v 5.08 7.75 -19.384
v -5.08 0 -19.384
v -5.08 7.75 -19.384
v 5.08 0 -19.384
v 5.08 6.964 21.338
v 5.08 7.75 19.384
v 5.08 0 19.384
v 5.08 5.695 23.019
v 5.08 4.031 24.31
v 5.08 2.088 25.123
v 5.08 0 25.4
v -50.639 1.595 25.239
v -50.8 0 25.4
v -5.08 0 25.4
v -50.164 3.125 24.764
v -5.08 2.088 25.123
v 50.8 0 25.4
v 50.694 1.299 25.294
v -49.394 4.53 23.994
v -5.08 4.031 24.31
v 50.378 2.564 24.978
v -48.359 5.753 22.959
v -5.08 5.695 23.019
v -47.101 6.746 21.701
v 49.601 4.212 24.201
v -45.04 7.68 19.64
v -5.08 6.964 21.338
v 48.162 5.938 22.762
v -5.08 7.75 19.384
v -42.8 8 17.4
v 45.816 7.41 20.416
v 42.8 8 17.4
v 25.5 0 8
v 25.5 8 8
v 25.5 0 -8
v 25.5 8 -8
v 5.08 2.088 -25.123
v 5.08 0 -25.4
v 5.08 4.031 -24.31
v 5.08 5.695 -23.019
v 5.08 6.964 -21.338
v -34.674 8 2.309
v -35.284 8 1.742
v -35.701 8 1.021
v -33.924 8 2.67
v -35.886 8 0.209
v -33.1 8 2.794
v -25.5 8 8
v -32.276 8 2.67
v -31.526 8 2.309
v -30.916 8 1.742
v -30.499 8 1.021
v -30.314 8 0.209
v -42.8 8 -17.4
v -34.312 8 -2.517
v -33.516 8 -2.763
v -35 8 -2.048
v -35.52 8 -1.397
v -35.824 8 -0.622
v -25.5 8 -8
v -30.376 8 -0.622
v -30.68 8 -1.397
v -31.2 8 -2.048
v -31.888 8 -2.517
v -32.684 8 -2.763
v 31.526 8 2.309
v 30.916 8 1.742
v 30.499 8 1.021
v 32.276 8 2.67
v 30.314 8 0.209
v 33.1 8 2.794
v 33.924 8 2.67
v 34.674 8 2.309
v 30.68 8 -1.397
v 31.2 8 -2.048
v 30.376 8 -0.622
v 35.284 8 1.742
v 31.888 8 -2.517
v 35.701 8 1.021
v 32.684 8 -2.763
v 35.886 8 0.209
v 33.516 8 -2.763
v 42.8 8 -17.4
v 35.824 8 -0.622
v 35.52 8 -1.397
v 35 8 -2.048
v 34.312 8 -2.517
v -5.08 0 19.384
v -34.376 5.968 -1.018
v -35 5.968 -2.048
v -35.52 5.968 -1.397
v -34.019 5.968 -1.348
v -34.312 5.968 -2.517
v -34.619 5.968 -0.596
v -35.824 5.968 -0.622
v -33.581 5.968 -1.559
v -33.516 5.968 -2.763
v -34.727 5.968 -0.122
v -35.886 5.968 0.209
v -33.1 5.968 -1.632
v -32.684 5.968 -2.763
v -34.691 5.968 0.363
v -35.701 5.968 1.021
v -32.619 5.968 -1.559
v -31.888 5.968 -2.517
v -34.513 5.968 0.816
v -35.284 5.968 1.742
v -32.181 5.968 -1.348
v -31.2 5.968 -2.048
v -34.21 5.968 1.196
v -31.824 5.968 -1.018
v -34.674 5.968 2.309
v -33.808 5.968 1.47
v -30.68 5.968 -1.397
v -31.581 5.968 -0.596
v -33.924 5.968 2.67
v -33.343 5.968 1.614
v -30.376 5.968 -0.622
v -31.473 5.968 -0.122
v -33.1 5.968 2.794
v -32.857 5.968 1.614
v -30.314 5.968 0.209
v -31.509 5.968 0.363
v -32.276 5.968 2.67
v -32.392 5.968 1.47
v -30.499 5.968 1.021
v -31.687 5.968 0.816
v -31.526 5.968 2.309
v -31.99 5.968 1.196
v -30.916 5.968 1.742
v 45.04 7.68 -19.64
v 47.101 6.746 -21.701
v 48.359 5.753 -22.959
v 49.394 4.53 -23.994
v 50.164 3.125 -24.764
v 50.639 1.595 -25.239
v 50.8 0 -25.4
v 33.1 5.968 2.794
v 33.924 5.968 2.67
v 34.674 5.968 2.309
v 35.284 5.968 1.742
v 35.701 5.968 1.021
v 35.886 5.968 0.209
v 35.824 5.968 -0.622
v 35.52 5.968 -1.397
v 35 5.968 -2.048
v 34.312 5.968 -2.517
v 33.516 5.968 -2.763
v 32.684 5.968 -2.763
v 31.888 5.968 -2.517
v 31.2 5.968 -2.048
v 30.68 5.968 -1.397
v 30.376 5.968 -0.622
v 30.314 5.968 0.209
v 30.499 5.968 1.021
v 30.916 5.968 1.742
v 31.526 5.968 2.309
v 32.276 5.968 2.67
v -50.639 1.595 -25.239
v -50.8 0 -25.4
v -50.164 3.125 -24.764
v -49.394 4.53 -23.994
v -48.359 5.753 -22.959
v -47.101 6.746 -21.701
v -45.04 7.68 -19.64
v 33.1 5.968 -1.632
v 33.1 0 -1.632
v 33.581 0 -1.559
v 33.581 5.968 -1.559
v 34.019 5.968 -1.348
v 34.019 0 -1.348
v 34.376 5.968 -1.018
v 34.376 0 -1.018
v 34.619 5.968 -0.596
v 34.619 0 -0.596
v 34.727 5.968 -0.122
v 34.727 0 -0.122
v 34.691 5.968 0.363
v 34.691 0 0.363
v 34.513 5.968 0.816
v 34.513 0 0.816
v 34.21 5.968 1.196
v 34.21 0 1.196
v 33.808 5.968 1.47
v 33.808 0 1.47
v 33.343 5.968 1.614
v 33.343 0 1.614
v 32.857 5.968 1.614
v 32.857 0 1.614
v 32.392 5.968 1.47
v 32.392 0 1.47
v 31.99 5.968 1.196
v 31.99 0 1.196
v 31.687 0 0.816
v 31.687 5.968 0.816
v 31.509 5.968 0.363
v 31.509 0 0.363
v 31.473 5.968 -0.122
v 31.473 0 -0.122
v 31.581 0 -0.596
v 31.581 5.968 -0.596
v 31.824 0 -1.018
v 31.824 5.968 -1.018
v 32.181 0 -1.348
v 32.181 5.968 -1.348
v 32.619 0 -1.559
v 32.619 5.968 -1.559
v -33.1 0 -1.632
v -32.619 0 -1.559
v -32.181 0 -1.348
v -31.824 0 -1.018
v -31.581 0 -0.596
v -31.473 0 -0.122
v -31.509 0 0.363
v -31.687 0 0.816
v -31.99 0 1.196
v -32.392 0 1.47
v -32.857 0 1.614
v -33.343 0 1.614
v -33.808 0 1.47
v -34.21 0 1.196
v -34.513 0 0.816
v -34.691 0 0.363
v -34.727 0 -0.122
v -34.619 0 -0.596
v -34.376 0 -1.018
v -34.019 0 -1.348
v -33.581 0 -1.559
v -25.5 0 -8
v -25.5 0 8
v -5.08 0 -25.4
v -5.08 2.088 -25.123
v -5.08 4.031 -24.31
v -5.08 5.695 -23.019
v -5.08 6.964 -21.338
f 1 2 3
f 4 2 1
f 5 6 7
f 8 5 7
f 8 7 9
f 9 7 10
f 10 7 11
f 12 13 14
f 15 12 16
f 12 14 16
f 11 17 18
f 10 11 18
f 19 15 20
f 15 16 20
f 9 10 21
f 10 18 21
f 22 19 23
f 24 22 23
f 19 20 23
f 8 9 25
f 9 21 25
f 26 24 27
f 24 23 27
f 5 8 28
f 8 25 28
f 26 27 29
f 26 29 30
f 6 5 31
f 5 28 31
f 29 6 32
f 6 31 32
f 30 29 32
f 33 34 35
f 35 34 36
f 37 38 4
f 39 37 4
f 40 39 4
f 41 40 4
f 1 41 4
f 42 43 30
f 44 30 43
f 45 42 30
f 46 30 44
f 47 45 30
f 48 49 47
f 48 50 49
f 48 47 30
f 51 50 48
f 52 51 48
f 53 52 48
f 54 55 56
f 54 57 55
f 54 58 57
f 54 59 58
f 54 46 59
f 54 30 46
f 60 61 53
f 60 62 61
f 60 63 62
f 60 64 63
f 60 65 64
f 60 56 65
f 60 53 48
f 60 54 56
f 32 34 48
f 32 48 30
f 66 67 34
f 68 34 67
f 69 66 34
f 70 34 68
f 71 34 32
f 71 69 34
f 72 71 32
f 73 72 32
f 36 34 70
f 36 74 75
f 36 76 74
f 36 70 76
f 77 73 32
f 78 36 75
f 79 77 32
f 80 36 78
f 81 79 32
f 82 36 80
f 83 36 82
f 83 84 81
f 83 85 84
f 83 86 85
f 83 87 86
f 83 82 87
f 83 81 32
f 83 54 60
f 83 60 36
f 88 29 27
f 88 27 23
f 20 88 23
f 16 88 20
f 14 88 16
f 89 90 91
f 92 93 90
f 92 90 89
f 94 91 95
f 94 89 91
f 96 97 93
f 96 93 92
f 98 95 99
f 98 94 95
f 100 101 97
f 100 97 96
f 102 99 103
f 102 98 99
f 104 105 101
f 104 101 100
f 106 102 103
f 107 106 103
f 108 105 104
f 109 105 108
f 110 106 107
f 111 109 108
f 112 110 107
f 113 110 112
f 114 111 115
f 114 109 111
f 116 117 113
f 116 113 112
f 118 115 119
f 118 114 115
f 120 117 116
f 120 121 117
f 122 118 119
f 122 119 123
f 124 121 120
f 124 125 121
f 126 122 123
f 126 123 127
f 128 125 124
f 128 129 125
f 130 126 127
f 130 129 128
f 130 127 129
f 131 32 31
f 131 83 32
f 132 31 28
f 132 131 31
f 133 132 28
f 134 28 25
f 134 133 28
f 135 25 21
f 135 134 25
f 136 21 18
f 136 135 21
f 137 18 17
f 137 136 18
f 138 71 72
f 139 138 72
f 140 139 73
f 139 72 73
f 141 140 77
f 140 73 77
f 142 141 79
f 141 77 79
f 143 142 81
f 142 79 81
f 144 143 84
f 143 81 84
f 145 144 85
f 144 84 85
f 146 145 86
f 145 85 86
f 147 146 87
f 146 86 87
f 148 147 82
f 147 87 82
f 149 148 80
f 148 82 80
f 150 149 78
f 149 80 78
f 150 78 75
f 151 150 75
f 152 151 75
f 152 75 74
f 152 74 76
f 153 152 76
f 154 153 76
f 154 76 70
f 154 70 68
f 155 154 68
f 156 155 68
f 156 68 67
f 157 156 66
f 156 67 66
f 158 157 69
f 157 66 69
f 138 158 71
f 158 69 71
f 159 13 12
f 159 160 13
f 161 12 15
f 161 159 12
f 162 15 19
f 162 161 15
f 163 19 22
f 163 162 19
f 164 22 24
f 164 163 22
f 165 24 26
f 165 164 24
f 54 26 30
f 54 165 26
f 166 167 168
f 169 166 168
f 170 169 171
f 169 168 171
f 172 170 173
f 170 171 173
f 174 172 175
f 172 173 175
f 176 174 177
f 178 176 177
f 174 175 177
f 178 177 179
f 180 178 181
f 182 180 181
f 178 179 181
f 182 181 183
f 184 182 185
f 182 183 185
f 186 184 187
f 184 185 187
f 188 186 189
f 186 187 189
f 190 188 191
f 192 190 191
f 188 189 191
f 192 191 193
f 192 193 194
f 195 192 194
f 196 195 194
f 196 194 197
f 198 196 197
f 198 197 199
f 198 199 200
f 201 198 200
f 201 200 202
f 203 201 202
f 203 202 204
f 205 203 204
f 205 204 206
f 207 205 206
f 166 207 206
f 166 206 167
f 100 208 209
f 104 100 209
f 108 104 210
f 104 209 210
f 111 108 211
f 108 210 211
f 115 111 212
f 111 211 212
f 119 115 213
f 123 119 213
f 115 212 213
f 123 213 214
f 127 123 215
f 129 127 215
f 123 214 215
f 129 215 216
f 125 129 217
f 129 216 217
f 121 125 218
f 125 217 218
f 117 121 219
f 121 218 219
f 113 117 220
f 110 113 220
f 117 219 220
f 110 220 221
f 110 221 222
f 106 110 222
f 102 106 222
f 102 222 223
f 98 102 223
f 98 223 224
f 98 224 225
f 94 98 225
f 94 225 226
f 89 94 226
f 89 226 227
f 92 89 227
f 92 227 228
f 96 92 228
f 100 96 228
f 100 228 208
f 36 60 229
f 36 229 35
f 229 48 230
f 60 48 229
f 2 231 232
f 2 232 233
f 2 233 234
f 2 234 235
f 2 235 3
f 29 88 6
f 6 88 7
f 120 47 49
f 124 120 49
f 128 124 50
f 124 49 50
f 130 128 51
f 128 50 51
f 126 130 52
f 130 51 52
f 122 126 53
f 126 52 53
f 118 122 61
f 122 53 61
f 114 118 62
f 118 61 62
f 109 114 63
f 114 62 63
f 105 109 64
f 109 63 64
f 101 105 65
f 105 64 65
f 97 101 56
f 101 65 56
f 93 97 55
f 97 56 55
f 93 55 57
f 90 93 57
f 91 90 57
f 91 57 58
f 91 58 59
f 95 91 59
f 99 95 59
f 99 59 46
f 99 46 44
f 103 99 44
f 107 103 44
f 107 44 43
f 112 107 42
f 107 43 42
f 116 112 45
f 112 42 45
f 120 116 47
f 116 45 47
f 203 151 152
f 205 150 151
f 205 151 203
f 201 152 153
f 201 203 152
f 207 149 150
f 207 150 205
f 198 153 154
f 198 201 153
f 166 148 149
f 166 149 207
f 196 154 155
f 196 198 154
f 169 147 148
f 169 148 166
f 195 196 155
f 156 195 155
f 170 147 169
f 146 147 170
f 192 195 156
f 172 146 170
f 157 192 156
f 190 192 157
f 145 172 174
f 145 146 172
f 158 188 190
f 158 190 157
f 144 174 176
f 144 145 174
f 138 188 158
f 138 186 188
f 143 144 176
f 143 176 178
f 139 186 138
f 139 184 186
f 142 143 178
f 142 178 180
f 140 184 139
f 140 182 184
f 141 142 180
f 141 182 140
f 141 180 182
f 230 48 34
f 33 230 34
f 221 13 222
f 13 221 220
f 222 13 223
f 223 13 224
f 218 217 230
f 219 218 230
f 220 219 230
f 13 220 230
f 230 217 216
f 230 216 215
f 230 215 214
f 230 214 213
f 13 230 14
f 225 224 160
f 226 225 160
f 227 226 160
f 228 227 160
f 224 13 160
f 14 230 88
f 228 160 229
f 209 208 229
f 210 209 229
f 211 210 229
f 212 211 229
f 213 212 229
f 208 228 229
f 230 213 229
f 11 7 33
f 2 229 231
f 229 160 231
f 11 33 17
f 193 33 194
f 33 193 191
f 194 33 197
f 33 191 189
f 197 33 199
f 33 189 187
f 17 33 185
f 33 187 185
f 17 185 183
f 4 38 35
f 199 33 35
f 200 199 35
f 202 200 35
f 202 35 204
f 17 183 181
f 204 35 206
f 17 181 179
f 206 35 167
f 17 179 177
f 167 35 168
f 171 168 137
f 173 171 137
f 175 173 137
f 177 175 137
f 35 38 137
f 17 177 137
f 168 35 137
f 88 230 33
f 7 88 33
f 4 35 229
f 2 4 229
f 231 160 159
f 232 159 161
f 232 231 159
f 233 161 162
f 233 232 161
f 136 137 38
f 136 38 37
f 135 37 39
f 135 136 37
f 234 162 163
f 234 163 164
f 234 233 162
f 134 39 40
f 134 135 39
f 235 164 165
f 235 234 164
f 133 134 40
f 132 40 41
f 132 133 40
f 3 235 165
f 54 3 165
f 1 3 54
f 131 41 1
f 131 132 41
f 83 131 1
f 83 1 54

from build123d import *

# Parameters (mm, degrees)
SKETCH2_W           = 101.6
SKETCH2_H           = 50.8
BOSS_EXTRUDE1_DEPTH = 8
SKETCH3_W           = 51
SKETCH3_H           = 16
CUT_EXTRUDE1_DEPTH  = 58.356778152
FILLET1_R           = 8
SKETCH5_R           = 1.63195
CUT_EXTRUDE2_DEPTH  = 58.356778152
SKETCH6_R           = 1.63195
CUT_EXTRUDE3_DEPTH  = 58.356778152
SKETCH7_W           = 10.16
SKETCH7_H           = 6.016
CUT_EXTRUDE4_DEPTH  = 58.356778152
SKETCH8_W           = 10.16
SKETCH8_H           = 6.016
CUT_EXTRUDE5_DEPTH  = 58.356778152
SKETCH9_R           = 2.794
CUT_EXTRUDE6_DEPTH  = 2.032
SKETCH10_R          = 2.794
CUT_EXTRUDE7_DEPTH  = 2.032


with BuildPart() as part:
    # Sketch2 → Boss-Extrude1 (new body)
    with BuildSketch(Plane(origin=(0, 0, 0), x_dir=(1, 0, 0), z_dir=(0, 1, 0))):
        Rectangle(SKETCH2_W, SKETCH2_H)
    extrude(amount=BOSS_EXTRUDE1_DEPTH)

    # Sketch3 → Cut-Extrude1 (cut, through all)
    with BuildSketch(Plane(origin=(0, 8, 0), x_dir=(1, 0, 0), z_dir=(0, 1, 0))):
        Rectangle(SKETCH3_W, SKETCH3_H)
    extrude(amount=-CUT_EXTRUDE1_DEPTH, mode=Mode.SUBTRACT)

    # Fillet1
    fillet1_edges = [part.edges().sort_by_distance(p)[0] for p in [
        (0, 8, -25.4),
        (50.8, 8, 0),
        (0, 8, 25.4),
        (-50.8, 8, 0),
    ]]
    fillet(fillet1_edges, radius=FILLET1_R - 0.0001)  # a hair under: the kernel refuses the full size

    # Sketch5 → Cut-Extrude2 (cut, through all)
    with BuildSketch(Plane.XZ):
        with Locations(Location((-33.1, 0, 0), (0, 0, 270))):
            Circle(SKETCH5_R)
    extrude(amount=-CUT_EXTRUDE2_DEPTH, mode=Mode.SUBTRACT)

    # Sketch6 → Cut-Extrude3 (cut, through all)
    with BuildSketch(Plane.XZ):
        with Locations(Location((33.1, 0, 0), (0, 0, 270))):
            Circle(SKETCH6_R)
    extrude(amount=-CUT_EXTRUDE3_DEPTH, mode=Mode.SUBTRACT)

    # Sketch7 → Cut-Extrude4 (cut, through all)
    with BuildSketch(Plane.XZ):
        with Locations((0, 22.392)):
            Rectangle(SKETCH7_W, SKETCH7_H)
    extrude(amount=-CUT_EXTRUDE4_DEPTH, mode=Mode.SUBTRACT)

    # Sketch8 → Cut-Extrude5 (cut, through all)
    with BuildSketch(Plane.XZ):
        with Locations((0, -22.392)):
            Rectangle(SKETCH8_W, SKETCH8_H)
    extrude(amount=-CUT_EXTRUDE5_DEPTH, mode=Mode.SUBTRACT)

    # Sketch9 → Cut-Extrude6 (cut)
    with BuildSketch(Plane(origin=(0, 8, 0), x_dir=(1, 0, 0), z_dir=(0, 1, 0))):
        with Locations(Location((-33.1, 0, 0), (0, 0, 270))):
            Circle(SKETCH9_R)
    extrude(amount=-CUT_EXTRUDE6_DEPTH, mode=Mode.SUBTRACT)

    # Sketch10 → Cut-Extrude7 (cut)
    with BuildSketch(Plane(origin=(0, 8, 0), x_dir=(1, 0, 0), z_dir=(0, 1, 0))):
        with Locations(Location((33.1, 0, 0), (0, 0, 270))):
            Circle(SKETCH10_R)
    extrude(amount=-CUT_EXTRUDE7_DEPTH, mode=Mode.SUBTRACT)


solid = part.part
